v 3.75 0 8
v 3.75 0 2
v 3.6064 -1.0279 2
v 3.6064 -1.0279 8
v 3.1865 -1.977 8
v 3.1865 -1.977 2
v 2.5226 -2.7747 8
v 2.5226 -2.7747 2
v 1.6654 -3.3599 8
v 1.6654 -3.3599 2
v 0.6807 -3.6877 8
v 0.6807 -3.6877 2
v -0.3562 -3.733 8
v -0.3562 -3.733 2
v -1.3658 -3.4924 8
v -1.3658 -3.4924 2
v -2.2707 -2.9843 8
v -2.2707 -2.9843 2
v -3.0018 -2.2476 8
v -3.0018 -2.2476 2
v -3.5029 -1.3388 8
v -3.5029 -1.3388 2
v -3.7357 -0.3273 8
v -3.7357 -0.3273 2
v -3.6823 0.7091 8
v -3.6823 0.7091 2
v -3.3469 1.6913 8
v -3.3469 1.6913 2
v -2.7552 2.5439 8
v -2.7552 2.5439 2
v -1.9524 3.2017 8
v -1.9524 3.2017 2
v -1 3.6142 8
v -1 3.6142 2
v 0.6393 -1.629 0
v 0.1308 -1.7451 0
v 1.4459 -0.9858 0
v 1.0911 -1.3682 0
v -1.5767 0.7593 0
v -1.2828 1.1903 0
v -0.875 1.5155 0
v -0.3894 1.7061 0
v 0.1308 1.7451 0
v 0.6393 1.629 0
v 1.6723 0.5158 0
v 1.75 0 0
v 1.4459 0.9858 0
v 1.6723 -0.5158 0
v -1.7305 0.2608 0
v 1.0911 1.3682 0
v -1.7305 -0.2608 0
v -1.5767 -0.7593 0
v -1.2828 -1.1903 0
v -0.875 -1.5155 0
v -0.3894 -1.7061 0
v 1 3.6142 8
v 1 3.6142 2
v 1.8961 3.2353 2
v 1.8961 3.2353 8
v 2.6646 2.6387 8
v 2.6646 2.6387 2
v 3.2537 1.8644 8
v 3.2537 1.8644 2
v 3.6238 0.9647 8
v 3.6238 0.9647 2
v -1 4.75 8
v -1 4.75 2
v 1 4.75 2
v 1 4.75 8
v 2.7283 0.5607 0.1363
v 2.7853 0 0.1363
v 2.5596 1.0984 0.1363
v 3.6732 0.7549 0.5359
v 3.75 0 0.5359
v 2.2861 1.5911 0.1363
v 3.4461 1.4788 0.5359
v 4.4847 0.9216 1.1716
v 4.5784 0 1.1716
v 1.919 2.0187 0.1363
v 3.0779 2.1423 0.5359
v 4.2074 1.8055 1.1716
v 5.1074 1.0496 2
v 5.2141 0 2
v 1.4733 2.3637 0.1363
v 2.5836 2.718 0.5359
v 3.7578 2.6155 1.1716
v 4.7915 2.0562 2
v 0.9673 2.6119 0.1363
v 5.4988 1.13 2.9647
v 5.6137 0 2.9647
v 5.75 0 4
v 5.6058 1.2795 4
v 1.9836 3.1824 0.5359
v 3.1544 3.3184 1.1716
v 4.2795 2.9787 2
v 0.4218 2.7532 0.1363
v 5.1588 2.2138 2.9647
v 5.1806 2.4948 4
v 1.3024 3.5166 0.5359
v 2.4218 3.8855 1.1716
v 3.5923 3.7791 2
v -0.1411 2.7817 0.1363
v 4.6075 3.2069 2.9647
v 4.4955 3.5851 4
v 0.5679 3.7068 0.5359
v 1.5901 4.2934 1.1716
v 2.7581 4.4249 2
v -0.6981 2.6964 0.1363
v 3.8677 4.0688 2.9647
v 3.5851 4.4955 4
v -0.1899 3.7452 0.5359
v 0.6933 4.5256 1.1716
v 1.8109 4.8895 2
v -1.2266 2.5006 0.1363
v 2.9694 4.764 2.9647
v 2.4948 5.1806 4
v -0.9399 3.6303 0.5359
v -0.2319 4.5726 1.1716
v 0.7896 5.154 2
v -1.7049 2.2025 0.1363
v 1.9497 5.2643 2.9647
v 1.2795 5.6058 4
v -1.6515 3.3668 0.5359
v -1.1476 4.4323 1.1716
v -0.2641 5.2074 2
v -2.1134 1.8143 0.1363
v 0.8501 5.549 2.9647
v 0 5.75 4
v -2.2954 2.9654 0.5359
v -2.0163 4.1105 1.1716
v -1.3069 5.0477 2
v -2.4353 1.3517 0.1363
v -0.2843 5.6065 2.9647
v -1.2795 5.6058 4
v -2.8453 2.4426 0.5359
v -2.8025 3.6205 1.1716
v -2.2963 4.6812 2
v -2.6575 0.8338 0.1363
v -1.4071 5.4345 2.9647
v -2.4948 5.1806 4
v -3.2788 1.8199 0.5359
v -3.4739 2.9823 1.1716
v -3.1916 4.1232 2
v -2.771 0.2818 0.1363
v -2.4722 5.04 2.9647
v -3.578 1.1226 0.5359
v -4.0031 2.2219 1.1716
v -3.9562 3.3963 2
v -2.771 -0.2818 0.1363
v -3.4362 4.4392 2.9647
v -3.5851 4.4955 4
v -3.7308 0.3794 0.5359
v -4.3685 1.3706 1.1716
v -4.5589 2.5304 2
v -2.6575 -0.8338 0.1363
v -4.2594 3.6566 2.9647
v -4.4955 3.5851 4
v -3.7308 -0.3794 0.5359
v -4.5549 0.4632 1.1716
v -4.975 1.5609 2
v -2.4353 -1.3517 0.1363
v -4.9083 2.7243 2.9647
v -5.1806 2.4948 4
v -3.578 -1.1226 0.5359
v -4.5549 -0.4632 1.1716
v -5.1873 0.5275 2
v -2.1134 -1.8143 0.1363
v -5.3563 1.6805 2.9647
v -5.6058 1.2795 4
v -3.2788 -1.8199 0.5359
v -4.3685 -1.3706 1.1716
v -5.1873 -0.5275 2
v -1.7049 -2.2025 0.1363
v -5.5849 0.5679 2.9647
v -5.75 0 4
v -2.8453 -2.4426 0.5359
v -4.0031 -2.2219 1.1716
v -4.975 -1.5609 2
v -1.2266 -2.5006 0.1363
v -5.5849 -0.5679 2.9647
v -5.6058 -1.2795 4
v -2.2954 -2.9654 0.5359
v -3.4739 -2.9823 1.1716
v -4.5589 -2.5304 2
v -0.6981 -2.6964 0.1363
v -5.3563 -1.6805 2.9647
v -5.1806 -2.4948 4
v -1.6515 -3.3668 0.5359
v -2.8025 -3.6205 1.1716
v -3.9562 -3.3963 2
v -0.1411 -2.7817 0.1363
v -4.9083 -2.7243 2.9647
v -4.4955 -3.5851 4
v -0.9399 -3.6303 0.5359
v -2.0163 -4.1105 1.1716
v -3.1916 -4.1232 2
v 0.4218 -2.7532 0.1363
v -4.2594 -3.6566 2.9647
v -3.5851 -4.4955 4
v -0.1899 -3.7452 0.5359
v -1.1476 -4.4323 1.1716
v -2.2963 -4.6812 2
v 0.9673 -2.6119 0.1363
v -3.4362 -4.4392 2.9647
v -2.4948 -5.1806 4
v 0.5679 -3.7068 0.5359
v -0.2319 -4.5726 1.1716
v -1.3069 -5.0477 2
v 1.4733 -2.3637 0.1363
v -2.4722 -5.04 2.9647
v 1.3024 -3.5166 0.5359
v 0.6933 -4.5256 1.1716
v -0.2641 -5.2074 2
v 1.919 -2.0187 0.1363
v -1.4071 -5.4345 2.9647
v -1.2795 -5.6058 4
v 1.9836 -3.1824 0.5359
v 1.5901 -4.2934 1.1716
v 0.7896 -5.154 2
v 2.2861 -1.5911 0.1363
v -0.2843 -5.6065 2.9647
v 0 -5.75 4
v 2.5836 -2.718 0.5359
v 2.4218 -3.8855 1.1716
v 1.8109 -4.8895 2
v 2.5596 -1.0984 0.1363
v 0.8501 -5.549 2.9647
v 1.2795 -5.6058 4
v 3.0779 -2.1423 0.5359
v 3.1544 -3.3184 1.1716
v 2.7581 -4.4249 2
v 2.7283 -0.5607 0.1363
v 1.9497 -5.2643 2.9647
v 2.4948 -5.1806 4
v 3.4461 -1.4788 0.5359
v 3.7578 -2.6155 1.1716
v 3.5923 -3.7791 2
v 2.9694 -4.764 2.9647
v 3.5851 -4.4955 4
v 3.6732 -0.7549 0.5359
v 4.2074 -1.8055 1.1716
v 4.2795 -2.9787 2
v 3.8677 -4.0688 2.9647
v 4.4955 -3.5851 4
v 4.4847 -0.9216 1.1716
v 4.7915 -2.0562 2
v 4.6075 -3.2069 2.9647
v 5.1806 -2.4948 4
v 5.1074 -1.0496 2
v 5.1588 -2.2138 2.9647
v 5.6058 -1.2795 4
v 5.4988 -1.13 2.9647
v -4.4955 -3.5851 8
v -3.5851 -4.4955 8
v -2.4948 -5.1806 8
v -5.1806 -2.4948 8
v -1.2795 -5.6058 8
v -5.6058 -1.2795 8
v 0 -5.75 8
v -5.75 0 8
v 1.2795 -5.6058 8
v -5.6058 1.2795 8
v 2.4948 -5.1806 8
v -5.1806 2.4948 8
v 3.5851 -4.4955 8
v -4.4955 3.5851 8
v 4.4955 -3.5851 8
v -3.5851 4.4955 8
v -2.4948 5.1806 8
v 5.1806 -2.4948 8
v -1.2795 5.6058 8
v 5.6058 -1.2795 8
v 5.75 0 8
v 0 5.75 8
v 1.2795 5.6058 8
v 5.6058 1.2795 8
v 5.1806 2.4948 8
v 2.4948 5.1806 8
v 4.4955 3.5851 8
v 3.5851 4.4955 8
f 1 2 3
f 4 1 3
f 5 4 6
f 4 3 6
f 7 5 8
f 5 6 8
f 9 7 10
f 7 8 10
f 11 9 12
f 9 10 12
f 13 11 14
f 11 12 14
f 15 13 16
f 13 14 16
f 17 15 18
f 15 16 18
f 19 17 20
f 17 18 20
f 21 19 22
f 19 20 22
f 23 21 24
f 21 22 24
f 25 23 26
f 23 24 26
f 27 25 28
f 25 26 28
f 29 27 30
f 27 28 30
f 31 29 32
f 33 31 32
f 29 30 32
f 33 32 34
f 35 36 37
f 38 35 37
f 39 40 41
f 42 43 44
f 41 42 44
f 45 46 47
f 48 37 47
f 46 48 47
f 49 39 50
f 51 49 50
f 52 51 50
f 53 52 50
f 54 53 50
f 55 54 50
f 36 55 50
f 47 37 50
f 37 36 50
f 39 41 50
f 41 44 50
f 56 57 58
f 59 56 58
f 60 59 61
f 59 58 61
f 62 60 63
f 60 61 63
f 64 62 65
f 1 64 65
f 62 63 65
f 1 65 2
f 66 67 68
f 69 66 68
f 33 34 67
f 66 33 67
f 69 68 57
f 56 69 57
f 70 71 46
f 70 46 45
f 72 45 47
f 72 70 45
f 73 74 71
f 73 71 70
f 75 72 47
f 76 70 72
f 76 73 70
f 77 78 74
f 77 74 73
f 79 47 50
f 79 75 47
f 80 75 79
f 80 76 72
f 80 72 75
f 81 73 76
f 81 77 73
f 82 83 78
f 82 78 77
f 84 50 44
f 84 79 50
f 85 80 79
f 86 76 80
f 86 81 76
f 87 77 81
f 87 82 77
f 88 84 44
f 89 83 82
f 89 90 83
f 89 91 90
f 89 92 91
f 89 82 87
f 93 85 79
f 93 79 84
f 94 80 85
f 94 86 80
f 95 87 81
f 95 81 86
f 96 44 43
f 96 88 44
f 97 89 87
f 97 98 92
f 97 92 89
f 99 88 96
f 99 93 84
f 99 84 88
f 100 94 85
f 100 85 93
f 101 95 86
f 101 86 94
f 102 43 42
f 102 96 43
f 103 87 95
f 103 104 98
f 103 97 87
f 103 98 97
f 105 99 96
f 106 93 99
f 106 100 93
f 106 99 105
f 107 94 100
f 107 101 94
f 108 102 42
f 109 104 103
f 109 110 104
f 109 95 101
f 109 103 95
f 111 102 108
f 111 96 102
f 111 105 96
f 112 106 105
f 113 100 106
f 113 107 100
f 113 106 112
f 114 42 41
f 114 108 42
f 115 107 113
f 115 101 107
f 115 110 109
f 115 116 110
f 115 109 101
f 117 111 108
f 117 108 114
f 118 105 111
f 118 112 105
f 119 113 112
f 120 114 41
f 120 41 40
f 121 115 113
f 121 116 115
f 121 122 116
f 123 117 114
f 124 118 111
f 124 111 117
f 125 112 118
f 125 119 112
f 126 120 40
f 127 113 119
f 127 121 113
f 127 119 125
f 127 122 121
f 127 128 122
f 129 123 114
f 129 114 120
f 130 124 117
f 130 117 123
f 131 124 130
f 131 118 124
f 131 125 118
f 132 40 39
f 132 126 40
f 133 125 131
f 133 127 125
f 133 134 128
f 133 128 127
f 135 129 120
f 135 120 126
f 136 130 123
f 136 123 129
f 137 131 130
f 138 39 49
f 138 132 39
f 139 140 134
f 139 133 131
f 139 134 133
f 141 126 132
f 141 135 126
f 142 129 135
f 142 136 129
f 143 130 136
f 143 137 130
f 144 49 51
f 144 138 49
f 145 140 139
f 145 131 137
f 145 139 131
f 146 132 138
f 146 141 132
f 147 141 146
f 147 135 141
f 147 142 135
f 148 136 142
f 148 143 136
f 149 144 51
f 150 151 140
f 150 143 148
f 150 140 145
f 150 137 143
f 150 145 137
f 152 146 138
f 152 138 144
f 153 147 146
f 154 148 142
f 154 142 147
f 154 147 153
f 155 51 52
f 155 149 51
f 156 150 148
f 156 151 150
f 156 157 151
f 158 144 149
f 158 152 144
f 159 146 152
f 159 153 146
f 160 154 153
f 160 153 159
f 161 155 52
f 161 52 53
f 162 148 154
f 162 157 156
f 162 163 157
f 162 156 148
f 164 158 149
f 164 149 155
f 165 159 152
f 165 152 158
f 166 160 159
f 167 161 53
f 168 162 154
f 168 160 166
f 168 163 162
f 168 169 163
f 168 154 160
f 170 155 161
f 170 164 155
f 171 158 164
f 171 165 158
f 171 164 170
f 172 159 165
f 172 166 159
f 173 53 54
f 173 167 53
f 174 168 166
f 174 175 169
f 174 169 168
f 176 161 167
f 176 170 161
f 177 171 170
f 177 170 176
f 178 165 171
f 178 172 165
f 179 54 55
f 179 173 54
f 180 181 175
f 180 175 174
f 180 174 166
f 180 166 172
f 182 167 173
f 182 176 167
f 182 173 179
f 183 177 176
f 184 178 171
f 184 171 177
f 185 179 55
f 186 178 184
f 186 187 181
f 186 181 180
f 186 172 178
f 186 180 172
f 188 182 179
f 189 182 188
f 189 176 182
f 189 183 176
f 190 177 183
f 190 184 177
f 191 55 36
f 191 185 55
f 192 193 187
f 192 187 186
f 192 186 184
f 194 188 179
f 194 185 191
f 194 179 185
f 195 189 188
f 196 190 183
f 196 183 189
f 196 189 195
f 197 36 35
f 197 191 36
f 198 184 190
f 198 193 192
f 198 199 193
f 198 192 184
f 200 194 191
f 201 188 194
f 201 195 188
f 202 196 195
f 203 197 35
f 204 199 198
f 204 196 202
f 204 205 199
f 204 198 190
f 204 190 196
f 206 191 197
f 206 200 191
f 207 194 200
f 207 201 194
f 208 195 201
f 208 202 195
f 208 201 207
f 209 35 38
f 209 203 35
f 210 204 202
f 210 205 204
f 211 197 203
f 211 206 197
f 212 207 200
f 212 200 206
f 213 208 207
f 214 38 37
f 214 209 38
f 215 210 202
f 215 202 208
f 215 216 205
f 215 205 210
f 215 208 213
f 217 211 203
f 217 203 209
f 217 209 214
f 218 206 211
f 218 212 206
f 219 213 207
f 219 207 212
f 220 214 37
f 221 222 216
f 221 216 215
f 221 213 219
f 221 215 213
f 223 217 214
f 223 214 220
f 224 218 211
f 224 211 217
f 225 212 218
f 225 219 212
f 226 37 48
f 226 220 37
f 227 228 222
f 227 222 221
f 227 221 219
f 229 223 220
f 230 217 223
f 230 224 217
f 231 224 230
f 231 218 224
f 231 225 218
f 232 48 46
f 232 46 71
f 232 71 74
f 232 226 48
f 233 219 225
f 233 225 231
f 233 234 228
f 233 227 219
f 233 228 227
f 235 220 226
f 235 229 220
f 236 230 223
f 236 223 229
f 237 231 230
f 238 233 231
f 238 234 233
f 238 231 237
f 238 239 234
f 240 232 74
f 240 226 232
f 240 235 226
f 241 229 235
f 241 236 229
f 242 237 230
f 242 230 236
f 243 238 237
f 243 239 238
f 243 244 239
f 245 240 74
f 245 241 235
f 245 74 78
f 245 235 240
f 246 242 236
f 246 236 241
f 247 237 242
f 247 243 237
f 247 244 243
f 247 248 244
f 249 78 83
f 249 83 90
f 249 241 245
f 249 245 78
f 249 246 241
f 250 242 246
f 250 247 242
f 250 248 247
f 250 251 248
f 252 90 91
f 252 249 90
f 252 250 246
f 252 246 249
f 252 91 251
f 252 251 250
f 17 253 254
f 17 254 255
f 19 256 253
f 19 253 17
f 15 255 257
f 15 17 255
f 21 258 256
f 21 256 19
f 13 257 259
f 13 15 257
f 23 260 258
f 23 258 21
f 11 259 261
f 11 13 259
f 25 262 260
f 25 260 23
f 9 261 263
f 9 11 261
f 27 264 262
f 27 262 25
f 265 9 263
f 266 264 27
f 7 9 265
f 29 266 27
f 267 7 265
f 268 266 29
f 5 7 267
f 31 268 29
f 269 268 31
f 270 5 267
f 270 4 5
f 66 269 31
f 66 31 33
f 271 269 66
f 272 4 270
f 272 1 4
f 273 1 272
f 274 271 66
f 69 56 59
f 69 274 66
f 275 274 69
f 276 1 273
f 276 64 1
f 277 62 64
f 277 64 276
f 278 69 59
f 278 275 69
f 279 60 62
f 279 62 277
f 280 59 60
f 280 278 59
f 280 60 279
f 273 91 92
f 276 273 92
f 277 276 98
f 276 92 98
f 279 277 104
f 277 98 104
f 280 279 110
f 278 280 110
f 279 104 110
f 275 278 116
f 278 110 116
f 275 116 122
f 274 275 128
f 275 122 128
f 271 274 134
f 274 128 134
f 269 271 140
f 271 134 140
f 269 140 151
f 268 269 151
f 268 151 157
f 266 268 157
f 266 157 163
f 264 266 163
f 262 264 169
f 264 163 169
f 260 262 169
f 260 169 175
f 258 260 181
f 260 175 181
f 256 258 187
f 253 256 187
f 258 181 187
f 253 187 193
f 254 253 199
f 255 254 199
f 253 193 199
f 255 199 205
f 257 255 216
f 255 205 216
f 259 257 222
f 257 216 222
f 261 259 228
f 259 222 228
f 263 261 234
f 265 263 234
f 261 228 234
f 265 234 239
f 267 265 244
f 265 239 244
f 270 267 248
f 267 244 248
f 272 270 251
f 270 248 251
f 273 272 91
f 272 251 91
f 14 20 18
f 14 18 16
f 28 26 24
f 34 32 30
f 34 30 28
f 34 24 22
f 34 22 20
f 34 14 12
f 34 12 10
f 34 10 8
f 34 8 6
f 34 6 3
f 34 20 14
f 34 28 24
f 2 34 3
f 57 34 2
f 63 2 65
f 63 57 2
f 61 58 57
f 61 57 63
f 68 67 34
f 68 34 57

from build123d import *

# Parameters (mm, degrees)
F0_R     = 5.75
F1_DEPTH = 8
F2_DEPTH = 2
F3_R     = 4


with BuildPart() as f1:
    # F0 (on Top) → F1 (new body)
    with BuildSketch(Plane.XY):
        Circle(F0_R)
        with BuildLine():
            ThreePointArc((1, 3.614208), (2.984334, 2.270738), (3.75, 0))
            ThreePointArc((3.75, 0), (-2.270738, -2.984334), (-1, 3.614208))
            Line((-1, 3.614208), (-1, 4.75))
            Line((-1, 4.75), (1, 4.75))
            Line((1, 4.75), (1, 3.614208))
        make_face(mode=Mode.SUBTRACT)
    extrude(amount=F1_DEPTH)

    # F0 (on Top) → F2 (join)
    with BuildSketch(Plane.XY):
        with BuildLine():
            ThreePointArc((-1, 3.614208), (0, 3.75), (1, 3.614208))
            Line((1, 3.614208), (1, 4.75))
            Line((1, 4.75), (-1, 4.75))
            Line((-1, 4.75), (-1, 3.614208))
        make_face()
        with BuildLine():
            Line((1, 2.75), (1, 3.614208))
            ThreePointArc((1, 3.614208), (0, 3.75), (-1, 3.614208))
            Line((-1, 3.614208), (-1, 2.75))
            Line((-1, 2.75), (1, 2.75))
        make_face()
        with BuildLine():
            ThreePointArc((-1, 3.614208), (-2.270738, -2.984334), (3.75, 0))
            ThreePointArc((3.75, 0), (2.984334, 2.270738), (1, 3.614208))
            Line((1, 3.614208), (1, 2.75))
            Line((1, 2.75), (-1, 2.75))
            Line((-1, 2.75), (-1, 3.614208))
        make_face()
    extrude(amount=F2_DEPTH)

    # F3
    f3_edges = [f1.edges().sort_by_distance(p)[0] for p in [
        (-5.75, 0, 0),
    ]]
    fillet(f3_edges, radius=F3_R)


solid = f1.part
